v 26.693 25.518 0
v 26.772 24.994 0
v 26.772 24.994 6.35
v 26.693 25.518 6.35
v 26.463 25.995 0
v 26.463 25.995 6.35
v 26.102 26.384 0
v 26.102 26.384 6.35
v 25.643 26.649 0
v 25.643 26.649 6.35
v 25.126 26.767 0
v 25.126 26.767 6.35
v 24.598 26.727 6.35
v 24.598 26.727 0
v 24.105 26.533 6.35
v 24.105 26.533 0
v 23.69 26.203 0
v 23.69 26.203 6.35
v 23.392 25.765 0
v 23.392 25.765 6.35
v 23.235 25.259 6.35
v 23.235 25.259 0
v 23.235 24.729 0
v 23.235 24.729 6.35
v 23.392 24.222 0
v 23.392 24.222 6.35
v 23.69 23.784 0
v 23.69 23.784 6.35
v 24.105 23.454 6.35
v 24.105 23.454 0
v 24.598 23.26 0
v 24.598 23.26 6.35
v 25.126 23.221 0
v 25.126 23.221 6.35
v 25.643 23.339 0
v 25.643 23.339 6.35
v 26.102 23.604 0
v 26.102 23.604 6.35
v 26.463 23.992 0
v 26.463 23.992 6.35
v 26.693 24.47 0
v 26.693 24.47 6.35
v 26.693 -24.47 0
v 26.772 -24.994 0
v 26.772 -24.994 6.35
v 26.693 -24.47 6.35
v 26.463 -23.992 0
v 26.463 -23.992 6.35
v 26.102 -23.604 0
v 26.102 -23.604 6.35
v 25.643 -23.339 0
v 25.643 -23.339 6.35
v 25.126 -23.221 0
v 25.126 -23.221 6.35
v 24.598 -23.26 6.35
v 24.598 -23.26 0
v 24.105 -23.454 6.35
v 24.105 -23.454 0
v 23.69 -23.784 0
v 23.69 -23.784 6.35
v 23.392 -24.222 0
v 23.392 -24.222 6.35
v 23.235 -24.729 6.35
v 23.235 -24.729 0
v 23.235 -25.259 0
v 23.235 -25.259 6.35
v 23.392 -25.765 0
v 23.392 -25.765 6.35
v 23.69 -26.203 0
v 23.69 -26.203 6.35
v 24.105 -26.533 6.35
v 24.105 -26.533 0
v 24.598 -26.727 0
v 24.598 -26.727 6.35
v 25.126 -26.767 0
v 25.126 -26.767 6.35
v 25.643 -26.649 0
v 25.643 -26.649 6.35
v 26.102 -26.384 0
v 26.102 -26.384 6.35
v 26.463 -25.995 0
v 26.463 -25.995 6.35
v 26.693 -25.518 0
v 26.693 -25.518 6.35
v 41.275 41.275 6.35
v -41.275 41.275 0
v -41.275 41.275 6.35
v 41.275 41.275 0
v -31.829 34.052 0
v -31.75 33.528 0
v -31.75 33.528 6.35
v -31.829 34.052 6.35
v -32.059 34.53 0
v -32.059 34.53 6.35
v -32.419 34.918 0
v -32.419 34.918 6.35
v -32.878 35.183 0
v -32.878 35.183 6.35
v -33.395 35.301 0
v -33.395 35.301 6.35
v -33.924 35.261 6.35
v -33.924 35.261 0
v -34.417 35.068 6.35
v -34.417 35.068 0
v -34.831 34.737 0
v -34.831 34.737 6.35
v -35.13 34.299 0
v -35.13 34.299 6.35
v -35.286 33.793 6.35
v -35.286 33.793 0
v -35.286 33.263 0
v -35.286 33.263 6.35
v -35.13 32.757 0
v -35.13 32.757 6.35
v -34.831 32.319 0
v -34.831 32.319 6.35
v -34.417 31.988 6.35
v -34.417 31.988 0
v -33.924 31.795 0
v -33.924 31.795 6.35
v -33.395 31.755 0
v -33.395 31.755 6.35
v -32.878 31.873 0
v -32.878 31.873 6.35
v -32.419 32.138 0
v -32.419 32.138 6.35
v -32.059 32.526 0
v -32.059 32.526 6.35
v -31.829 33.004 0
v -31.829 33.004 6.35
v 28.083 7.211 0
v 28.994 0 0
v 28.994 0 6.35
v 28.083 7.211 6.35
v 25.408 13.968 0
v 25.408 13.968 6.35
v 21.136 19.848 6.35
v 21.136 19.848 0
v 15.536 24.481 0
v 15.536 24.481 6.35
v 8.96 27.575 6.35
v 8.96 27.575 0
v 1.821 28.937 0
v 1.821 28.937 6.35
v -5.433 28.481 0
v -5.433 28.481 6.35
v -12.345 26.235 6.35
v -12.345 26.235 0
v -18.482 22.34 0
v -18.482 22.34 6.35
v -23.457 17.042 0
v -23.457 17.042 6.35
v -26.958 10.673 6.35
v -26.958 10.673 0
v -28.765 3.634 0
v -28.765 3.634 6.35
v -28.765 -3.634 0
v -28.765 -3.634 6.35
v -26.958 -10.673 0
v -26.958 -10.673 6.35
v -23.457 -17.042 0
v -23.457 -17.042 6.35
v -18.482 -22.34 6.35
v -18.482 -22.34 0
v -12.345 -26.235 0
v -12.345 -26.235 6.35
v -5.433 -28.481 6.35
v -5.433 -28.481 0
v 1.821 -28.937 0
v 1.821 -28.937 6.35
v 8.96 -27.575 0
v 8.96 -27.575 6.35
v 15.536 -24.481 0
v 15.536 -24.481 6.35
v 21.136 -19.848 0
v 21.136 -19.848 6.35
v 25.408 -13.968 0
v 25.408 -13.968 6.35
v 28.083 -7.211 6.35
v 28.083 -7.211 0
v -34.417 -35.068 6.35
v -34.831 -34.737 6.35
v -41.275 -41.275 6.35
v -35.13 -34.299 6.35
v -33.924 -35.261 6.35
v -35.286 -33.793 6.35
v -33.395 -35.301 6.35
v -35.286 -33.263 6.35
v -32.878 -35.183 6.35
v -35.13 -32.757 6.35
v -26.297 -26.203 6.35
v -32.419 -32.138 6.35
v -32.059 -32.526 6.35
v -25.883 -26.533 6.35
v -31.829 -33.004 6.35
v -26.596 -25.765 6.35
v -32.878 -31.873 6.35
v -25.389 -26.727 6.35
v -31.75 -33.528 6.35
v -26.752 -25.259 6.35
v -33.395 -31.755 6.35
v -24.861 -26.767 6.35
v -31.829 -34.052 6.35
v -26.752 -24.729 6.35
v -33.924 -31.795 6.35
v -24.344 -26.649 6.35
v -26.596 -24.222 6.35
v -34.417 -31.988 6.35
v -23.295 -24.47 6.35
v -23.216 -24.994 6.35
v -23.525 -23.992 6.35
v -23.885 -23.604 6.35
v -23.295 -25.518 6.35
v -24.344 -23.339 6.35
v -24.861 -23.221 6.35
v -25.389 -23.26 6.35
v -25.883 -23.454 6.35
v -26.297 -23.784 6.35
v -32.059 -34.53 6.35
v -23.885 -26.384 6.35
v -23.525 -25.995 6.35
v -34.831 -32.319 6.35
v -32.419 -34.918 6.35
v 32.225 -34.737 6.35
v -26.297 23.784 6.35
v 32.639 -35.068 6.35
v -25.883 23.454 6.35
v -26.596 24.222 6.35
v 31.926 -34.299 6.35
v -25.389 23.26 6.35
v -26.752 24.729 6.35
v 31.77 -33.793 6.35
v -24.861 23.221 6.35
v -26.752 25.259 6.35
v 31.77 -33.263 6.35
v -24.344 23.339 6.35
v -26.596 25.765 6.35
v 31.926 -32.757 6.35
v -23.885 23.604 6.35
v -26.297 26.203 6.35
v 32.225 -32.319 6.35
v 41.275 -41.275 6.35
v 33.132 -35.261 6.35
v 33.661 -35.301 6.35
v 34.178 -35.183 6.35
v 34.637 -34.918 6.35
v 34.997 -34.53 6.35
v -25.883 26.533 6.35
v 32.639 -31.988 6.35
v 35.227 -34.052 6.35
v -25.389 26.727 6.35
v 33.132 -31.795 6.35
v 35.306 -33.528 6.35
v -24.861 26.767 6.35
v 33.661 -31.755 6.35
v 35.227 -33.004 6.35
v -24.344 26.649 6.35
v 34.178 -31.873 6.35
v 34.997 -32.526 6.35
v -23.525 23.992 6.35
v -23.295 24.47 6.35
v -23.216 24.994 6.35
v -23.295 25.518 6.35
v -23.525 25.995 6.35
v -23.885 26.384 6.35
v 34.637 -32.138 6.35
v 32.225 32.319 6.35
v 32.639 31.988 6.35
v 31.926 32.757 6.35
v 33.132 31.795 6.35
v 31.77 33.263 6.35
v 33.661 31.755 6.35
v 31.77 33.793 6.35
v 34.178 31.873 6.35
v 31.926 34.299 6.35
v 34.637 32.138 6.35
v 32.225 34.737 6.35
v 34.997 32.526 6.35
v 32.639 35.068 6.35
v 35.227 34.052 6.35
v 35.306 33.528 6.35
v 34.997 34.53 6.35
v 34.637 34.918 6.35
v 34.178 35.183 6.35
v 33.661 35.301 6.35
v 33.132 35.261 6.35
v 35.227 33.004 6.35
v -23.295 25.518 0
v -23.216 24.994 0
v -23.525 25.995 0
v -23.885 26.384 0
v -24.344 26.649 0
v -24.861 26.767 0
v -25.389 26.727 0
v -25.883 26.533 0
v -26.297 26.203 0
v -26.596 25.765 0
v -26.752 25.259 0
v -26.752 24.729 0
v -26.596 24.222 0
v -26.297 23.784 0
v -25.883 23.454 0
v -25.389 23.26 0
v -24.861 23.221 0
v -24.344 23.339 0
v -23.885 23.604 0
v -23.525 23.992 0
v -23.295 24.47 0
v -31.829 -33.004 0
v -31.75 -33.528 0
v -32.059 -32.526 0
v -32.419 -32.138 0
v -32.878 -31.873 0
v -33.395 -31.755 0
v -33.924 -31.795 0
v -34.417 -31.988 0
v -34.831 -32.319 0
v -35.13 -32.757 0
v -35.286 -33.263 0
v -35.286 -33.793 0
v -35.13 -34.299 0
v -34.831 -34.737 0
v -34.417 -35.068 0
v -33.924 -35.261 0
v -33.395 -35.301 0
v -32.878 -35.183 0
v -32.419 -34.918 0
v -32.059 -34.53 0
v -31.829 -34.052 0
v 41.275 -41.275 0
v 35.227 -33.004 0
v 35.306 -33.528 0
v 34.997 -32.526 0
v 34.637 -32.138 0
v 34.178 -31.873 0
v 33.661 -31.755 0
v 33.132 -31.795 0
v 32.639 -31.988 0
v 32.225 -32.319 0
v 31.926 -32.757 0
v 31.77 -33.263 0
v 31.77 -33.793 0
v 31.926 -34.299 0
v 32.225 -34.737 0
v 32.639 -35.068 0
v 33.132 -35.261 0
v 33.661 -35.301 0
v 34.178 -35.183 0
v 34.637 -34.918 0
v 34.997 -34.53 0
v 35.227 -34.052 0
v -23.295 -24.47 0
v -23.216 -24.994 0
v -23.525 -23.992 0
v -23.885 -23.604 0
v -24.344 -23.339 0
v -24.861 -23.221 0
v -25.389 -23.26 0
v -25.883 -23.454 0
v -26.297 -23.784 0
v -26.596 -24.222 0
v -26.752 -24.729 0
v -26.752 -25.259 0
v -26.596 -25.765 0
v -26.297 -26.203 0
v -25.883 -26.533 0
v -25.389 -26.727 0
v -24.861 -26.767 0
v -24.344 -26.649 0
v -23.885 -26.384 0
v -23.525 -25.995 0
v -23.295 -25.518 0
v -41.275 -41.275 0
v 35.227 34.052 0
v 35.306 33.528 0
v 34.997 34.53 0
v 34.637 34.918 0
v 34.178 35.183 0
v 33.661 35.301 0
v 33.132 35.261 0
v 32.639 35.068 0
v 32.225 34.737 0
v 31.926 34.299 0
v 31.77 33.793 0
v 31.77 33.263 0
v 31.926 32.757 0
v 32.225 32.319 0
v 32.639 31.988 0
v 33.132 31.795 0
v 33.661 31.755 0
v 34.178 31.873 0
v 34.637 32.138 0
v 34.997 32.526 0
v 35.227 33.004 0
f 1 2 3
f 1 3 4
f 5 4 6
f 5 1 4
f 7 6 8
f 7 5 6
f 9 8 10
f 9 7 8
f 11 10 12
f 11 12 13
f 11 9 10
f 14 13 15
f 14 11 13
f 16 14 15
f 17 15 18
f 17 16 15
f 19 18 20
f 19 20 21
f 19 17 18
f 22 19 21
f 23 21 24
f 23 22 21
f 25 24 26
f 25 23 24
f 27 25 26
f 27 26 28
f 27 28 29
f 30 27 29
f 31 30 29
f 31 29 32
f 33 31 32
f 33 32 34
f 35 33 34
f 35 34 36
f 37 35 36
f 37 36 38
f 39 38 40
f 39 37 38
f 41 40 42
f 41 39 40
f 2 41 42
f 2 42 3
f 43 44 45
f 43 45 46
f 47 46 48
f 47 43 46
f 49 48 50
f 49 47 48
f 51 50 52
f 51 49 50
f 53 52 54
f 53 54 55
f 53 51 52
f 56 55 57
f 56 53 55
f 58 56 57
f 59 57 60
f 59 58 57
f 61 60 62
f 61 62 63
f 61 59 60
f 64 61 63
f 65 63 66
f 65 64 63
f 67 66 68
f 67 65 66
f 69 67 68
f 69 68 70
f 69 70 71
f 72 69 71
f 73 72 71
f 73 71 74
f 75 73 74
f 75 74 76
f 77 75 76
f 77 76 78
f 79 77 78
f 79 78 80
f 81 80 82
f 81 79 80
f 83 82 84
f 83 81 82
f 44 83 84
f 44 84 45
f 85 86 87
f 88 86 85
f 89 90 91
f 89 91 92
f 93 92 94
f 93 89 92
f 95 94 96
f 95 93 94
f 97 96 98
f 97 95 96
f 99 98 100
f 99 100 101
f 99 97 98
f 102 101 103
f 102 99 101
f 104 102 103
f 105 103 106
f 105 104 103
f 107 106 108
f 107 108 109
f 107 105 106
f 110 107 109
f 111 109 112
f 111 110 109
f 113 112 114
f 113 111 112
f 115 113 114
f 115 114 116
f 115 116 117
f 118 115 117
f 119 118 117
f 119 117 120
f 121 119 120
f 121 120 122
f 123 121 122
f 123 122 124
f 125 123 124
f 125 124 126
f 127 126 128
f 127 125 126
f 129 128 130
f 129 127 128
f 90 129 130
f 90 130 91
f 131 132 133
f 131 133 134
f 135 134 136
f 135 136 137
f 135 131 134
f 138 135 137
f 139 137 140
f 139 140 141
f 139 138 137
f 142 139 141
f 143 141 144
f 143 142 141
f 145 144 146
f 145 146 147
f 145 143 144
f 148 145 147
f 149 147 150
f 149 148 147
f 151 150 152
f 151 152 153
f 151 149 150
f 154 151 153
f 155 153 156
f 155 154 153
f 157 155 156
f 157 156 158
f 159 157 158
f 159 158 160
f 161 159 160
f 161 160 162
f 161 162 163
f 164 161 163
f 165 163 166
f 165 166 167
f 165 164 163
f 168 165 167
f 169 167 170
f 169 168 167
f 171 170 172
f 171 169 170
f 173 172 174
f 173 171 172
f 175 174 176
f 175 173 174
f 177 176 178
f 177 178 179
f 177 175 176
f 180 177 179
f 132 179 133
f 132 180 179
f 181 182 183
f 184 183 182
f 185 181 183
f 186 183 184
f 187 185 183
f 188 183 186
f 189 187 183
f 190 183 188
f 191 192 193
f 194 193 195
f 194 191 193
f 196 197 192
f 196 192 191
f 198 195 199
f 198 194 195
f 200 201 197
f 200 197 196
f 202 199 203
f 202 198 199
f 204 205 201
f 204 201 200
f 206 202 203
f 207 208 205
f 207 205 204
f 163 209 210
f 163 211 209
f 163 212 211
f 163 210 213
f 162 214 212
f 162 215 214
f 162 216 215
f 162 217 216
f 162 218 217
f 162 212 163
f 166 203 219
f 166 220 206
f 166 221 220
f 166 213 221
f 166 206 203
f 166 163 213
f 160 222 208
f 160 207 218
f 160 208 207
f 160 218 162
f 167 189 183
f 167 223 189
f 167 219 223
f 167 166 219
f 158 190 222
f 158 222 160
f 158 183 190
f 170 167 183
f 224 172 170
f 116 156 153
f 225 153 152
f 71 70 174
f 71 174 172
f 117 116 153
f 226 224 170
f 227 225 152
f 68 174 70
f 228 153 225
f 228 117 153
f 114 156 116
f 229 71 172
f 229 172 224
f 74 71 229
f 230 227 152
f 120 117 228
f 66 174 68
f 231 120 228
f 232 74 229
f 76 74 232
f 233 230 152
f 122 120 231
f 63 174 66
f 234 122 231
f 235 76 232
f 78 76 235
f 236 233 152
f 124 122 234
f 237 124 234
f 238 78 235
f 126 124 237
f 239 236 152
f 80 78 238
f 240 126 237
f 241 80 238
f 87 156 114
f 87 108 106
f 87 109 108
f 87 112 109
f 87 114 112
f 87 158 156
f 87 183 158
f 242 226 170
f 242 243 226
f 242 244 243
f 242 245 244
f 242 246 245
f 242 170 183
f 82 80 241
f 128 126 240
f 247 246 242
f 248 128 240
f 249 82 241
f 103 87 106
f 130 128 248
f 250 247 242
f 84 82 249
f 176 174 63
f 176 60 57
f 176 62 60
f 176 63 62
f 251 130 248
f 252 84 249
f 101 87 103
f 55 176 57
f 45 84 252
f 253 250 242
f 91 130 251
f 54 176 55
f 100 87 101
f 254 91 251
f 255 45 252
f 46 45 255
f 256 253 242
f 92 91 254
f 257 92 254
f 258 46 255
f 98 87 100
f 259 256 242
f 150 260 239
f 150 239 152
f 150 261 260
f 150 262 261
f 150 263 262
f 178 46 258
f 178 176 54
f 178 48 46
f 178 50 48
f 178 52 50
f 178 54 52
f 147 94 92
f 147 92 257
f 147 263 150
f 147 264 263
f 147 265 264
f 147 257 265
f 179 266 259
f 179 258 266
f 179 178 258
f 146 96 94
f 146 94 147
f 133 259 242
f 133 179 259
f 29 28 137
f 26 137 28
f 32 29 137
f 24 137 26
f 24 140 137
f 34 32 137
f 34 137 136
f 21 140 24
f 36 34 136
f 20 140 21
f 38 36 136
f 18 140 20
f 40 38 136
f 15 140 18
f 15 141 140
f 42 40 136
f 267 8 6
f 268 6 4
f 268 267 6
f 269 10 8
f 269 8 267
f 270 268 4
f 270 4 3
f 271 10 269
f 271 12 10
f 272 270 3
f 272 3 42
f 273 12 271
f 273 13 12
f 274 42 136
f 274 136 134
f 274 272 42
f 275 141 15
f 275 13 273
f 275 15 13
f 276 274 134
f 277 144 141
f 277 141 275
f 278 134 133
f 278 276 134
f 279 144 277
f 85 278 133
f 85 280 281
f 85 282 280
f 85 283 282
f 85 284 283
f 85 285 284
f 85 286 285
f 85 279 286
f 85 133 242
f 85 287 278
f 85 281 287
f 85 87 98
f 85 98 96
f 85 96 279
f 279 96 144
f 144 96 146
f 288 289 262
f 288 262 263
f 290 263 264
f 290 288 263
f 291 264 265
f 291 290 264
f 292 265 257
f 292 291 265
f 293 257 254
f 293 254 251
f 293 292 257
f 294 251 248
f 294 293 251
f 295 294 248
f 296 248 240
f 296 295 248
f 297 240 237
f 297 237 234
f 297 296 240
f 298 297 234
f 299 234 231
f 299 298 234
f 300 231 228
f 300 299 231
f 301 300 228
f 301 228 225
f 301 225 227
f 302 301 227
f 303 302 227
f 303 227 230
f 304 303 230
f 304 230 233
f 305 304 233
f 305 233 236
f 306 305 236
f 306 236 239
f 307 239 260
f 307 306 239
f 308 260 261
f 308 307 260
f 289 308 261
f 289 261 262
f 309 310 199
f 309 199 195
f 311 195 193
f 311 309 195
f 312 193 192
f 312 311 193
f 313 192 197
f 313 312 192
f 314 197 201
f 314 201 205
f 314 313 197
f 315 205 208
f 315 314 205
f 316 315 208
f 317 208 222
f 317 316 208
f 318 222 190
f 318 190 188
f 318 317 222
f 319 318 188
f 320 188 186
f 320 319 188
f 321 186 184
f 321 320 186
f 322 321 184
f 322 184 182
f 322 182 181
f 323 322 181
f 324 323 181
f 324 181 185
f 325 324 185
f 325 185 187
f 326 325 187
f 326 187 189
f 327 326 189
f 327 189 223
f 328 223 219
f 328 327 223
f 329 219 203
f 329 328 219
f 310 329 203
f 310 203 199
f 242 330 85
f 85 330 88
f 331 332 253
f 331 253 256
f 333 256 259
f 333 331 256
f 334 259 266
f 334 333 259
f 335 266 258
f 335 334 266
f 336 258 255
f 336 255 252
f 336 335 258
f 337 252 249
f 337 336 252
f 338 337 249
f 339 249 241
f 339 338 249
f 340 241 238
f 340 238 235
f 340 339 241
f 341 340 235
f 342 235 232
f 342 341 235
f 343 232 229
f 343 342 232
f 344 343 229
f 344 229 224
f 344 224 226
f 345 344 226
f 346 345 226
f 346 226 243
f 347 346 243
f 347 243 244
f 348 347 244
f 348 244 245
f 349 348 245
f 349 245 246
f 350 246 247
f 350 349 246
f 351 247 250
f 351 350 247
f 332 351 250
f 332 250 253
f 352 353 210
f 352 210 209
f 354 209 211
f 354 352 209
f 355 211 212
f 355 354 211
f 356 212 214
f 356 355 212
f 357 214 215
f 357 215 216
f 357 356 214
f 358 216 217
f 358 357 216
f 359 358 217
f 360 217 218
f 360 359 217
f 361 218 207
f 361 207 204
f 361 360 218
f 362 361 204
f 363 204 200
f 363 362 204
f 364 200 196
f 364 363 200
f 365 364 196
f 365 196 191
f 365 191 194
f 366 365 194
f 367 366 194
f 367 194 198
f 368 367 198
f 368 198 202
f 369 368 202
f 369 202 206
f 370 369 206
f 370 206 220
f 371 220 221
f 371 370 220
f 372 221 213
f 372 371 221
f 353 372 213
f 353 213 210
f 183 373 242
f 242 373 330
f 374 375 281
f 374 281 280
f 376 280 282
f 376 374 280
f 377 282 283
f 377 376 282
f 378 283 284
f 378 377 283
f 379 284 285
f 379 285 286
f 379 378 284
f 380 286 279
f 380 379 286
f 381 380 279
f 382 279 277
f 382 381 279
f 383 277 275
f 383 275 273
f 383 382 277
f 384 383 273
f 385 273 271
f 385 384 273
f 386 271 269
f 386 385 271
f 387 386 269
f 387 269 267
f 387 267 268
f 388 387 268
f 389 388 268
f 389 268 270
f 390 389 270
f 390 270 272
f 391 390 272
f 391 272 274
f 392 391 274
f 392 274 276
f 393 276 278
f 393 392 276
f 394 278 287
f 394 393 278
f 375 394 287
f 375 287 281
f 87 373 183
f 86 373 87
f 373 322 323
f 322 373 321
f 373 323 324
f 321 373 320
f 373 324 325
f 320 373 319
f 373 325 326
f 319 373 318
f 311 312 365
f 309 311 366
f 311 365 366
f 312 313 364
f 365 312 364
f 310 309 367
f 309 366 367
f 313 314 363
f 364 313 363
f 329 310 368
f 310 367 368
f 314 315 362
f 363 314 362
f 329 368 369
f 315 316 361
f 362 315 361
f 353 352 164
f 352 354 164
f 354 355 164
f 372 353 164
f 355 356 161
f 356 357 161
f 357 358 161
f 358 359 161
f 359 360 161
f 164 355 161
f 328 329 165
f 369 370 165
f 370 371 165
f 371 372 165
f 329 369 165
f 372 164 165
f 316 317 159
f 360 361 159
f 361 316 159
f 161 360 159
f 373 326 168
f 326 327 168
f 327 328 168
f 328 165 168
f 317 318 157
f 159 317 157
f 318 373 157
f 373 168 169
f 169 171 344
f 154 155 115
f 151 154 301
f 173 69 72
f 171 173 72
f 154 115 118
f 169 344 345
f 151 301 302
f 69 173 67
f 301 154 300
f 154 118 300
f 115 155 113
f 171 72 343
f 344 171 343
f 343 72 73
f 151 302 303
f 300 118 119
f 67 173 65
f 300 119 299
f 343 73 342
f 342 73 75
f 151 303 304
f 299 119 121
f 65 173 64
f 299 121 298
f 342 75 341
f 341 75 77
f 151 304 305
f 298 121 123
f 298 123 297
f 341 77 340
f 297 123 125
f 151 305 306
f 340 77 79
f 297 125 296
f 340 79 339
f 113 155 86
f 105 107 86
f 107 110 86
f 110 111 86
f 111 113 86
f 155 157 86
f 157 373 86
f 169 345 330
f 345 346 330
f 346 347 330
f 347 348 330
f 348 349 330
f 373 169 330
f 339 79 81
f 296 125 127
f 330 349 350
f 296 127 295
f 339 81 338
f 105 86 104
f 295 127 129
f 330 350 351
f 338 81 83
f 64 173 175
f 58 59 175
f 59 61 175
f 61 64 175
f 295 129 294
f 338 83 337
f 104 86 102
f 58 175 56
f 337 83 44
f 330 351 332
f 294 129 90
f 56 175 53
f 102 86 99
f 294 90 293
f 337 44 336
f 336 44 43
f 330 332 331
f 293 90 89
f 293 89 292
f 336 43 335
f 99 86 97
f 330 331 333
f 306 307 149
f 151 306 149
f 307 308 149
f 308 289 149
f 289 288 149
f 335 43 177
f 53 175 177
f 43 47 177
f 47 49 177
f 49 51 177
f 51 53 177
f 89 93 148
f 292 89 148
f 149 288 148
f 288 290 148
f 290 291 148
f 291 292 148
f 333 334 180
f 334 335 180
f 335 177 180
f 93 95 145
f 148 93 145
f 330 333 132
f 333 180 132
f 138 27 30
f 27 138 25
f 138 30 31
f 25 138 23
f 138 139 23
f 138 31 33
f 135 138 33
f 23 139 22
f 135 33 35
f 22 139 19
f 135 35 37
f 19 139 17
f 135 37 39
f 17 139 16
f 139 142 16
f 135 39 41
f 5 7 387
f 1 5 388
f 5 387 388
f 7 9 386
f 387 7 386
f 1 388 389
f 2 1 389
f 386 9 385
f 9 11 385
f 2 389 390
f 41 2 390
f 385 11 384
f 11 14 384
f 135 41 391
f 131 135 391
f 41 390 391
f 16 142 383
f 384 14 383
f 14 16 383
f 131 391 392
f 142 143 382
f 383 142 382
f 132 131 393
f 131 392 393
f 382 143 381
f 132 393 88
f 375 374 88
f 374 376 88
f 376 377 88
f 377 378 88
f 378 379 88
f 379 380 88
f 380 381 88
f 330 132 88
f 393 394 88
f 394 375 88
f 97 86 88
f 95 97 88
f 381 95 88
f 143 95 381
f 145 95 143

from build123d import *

# Parameters (mm, degrees)
F0_W     = 82.55
F0_H     = 82.55
F0_R     = 1.778
F0_R_2   = 28.9941
F1_DEPTH = 6.35


# Not quite as in the source:
# - a length typed as a fraction of an inch, garbled in the dataset ("3 / 203.2 mm" for 3/8 in), is restored


with BuildPart() as f1:
    # F0 (on Top) → F1 (new body)
    with BuildSketch(Plane.XY):
        Rectangle(F0_W, F0_H)
        with Locations((-33.528, -33.528)):
            Circle(F0_R, mode=Mode.SUBTRACT)
        with Locations((-24.9936, -24.9936)):
            Circle(F0_R, mode=Mode.SUBTRACT)
        with Locations((33.528, -33.528)):
            Circle(F0_R, mode=Mode.SUBTRACT)
        with Locations((24.9936, -24.9936)):
            Circle(F0_R, mode=Mode.SUBTRACT)
        with Locations((-24.9936, 24.9936)):
            Circle(F0_R, mode=Mode.SUBTRACT)
        with Locations((-33.528, 33.528)):
            Circle(F0_R, mode=Mode.SUBTRACT)
        Circle(F0_R_2, mode=Mode.SUBTRACT)
        with Locations((24.9936, 24.9936)):
            Circle(F0_R, mode=Mode.SUBTRACT)
        with Locations((33.528, 33.528)):
            Circle(F0_R, mode=Mode.SUBTRACT)
    extrude(amount=F1_DEPTH)


solid = f1.part
